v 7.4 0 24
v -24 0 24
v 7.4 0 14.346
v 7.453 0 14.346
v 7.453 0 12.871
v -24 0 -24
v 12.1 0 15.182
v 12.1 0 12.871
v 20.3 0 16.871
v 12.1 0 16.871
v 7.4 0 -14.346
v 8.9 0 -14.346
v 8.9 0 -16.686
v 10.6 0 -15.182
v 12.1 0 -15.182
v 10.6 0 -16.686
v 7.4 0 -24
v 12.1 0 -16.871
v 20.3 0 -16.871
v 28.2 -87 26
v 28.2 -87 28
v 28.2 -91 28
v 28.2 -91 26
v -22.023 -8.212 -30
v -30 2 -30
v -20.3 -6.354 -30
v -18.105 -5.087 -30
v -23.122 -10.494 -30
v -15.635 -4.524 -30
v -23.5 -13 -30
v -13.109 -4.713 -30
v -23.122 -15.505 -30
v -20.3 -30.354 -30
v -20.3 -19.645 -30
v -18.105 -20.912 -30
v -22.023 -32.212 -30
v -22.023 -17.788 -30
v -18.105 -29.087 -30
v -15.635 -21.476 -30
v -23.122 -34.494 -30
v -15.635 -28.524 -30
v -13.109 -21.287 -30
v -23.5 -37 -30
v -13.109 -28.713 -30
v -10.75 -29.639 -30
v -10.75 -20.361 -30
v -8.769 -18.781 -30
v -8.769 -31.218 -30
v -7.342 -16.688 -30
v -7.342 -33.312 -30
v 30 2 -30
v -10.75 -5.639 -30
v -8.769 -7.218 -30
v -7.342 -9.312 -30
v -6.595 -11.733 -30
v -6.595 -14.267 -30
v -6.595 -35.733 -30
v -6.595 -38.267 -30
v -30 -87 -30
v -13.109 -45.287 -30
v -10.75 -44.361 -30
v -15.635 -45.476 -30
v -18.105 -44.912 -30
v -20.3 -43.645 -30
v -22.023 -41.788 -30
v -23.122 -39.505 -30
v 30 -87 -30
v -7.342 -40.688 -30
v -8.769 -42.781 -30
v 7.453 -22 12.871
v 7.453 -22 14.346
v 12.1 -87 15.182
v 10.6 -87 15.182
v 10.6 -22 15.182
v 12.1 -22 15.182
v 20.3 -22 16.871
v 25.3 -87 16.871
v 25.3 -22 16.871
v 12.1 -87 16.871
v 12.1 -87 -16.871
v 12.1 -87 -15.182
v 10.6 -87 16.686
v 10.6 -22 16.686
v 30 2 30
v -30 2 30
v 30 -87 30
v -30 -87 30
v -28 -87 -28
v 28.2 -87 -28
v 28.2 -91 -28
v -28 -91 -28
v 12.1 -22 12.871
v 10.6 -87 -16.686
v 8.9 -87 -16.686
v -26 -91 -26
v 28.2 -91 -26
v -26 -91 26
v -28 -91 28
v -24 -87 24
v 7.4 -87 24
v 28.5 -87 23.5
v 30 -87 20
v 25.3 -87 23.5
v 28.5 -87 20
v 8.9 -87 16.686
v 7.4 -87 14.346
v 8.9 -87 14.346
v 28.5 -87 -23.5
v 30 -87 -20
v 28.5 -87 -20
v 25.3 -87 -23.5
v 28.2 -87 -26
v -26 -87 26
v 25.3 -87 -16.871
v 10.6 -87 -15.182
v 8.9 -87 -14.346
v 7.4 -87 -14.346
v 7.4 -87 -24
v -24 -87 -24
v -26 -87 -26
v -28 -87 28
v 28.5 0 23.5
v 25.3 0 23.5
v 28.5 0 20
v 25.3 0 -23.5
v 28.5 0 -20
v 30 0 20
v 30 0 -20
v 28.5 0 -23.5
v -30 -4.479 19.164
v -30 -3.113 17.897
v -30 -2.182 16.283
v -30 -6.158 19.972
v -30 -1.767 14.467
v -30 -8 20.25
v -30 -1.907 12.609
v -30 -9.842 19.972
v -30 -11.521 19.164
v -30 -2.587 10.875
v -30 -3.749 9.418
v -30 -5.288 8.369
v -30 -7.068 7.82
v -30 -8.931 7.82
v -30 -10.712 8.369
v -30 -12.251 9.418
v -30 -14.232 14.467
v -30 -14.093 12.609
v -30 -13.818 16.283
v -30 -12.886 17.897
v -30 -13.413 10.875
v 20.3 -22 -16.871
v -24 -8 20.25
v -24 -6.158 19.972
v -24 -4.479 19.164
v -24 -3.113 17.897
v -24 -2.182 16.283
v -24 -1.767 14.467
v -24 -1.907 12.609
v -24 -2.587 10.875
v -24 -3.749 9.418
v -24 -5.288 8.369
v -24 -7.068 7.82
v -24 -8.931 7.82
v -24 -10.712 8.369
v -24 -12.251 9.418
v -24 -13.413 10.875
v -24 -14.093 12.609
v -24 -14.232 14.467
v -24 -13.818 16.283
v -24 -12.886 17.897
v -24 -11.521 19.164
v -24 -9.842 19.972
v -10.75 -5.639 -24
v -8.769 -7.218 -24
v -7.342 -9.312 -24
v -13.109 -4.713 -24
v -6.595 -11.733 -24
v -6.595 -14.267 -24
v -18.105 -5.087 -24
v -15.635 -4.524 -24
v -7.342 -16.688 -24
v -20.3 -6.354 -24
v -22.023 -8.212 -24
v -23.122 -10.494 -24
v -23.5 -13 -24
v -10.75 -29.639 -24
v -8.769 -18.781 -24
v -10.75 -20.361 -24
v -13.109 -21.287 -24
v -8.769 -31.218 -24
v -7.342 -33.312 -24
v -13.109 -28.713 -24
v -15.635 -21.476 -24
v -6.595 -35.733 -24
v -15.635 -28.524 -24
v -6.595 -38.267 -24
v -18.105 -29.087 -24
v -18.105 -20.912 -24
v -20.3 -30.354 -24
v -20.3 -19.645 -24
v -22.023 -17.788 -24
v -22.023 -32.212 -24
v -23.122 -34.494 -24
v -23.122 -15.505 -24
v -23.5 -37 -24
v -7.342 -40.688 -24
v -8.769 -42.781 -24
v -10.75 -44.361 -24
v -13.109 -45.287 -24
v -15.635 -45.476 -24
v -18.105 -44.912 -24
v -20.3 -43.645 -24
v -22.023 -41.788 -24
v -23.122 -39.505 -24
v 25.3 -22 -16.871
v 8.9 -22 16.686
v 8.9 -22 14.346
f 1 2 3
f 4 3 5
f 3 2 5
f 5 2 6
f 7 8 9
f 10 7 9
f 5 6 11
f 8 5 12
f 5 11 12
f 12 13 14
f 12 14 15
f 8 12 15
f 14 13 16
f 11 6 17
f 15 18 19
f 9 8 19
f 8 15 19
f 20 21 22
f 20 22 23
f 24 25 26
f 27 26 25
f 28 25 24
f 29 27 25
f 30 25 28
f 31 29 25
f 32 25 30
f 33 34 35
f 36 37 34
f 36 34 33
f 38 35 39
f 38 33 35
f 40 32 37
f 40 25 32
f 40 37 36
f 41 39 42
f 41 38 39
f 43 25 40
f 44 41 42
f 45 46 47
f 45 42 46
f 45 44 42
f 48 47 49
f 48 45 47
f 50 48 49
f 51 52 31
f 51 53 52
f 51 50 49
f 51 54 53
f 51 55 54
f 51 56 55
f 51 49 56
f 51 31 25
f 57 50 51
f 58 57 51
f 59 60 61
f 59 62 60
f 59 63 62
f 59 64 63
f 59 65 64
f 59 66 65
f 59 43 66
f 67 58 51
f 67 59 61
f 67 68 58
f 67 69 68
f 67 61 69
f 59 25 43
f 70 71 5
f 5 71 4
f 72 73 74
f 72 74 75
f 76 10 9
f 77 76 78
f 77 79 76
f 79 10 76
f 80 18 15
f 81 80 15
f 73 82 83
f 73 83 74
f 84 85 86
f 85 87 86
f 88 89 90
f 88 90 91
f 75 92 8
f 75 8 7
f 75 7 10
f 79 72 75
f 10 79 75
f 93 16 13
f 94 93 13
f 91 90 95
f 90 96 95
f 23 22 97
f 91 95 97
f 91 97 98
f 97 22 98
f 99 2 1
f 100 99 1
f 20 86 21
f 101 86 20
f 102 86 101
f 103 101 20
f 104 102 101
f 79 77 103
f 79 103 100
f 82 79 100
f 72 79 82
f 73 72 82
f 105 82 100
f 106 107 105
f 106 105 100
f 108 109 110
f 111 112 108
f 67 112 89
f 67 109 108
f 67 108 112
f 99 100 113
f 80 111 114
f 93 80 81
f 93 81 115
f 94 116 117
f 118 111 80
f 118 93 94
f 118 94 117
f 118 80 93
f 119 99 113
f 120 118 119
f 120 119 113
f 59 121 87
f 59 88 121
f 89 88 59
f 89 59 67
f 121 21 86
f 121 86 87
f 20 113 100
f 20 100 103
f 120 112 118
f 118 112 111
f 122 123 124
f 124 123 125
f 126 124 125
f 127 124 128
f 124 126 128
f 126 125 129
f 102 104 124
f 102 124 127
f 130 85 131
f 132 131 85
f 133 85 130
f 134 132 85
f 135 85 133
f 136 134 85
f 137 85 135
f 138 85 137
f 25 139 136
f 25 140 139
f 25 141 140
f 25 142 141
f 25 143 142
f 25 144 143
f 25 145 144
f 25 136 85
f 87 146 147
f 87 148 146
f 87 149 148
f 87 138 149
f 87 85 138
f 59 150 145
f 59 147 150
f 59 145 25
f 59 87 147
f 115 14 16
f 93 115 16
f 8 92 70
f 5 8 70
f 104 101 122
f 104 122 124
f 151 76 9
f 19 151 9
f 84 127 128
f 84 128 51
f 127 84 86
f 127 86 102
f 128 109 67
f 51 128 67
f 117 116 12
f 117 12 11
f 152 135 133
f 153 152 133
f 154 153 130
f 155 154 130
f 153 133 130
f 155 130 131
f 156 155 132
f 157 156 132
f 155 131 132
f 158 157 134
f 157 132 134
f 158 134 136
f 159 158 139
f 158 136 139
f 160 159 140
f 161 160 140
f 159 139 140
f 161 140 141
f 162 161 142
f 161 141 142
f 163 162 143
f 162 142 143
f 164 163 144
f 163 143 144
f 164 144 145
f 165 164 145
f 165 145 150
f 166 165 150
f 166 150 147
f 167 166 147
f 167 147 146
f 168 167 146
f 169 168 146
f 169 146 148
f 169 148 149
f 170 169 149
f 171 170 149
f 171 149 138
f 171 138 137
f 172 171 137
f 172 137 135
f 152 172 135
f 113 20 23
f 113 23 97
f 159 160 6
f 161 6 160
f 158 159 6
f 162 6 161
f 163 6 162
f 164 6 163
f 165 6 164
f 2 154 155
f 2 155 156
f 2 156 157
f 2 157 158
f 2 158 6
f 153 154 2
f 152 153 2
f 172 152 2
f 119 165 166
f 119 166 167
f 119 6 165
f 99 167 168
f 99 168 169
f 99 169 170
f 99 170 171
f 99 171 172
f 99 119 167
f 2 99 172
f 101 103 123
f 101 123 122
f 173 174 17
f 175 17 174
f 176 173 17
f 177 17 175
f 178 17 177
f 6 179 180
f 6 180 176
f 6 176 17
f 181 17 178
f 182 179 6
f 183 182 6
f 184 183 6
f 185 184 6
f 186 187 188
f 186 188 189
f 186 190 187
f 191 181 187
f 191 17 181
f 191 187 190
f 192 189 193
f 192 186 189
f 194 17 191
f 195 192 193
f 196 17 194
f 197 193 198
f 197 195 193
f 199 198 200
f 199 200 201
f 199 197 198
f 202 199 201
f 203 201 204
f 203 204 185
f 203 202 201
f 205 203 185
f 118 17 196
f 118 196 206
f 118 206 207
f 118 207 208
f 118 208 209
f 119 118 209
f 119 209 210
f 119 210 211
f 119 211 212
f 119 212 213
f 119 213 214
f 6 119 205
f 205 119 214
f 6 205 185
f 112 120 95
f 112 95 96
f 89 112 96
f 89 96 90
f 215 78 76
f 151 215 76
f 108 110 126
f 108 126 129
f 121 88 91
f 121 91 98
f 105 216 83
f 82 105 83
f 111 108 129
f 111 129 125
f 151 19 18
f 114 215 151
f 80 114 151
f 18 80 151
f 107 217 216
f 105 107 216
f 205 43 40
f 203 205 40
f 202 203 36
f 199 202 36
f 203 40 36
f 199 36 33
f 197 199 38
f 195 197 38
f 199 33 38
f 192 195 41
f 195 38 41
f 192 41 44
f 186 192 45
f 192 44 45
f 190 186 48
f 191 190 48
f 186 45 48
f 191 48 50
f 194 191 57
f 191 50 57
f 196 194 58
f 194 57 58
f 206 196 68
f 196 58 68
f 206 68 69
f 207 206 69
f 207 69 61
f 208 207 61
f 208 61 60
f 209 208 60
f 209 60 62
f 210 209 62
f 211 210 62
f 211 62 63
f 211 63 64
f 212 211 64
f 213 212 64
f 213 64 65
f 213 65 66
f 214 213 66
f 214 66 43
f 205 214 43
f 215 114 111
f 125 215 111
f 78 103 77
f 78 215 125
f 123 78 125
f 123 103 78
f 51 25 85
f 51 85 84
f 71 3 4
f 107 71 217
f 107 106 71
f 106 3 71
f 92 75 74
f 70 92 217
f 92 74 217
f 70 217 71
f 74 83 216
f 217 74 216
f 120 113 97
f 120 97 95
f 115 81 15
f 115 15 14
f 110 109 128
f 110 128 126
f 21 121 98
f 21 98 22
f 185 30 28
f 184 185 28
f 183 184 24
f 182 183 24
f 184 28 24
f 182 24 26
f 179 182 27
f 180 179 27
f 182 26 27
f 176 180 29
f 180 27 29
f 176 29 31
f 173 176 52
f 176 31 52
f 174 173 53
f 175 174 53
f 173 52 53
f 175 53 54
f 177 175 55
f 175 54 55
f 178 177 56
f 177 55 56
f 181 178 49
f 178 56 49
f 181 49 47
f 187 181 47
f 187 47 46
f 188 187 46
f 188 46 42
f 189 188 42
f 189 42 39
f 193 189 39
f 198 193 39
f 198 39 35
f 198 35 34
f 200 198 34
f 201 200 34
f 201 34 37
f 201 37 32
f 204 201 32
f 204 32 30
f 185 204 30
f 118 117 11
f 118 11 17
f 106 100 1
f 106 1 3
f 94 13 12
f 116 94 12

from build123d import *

# Parameters (mm, degrees)
BOSS_EXTRUDE1_DEPTH      = 0.0001
BOSS_EXTRUDE1_DEPTH_BACK = 87
SKETCH4_W                = 60
SKETCH4_H                = 60
BOSS_EXTRUDE2_DEPTH      = 2
SKETCH10_W               = 4.646690451
SKETCH10_H               = 22.0001
BOSS_EXTRUDE6_DEPTH      = 4
SKETCH12_W               = 5
SKETCH12_H               = 22.0001
BOSS_EXTRUDE7_DEPTH      = 33.742899166
BOSS_EXTRUDE8_DEPTH      = 4
SKETCH13_R               = 6.25
CUT_EXTRUDE1_DEPTH       = 10
SKETCH14_R               = 8.5
CUT_EXTRUDE2_DEPTH       = 10


with BuildPart() as part:
    # Sketch1 → Boss-Extrude1 (new, two sides: drawn at the far end of the back side and taken through both)
    with BuildSketch(Plane(origin=(0, 0, 0), x_dir=(1, 0, 0), z_dir=(0, 1, 0)).offset(-BOSS_EXTRUDE1_DEPTH_BACK)):
        Polygon((30, 20), (28.5, 20), (28.5, 23.5), (25.3, 23.5), (25.3, 16.871449583), (12.1, 16.871449583), (12.1, 15.181819085), (10.6, 15.181819085), (10.6, 16.685724792), (8.9, 16.685724792), (8.9, 14.346236409), (7.4, 14.346236409), (7.4, 24), (-24, 24), (-24, -24), (7.4, -24), (7.4, -14.346236409), (8.9, -14.346236409), (8.9, -16.685724792), (10.6, -16.685724792), (10.6, -15.181819085), (12.1, -15.181819085), (12.1, -16.871449583), (25.3, -16.871449583), (25.3, -23.5), (28.5, -23.5), (28.5, -20), (30, -20), (30, -30), (-30, -30), (-30, 30), (30, 30), align=None)
    extrude(amount=BOSS_EXTRUDE1_DEPTH + BOSS_EXTRUDE1_DEPTH_BACK)

    # Sketch4 → Boss-Extrude2 (add)
    with BuildSketch(Plane(origin=(0, 0.0001, 0), x_dir=(1, 0, 0), z_dir=(0, 1, 0))):
        Rectangle(SKETCH4_W, SKETCH4_H)
    extrude(amount=BOSS_EXTRUDE2_DEPTH)

    # Sketch10 → Boss-Extrude6 (add)
    with BuildSketch(Plane(origin=(0, 0, 16.871449583), x_dir=(-1, 0, 0), z_dir=(0, 0, -1))):
        with Locations((-9.776654775, -10.99995)):
            Rectangle(SKETCH10_W, SKETCH10_H)
    extrude(amount=BOSS_EXTRUDE6_DEPTH)

    # Sketch12 → Boss-Extrude7 (add)
    with BuildSketch(Plane(origin=(0, 0, 16.871449583), x_dir=(-1, 0, 0), z_dir=(0, 0, -1))):
        with Locations((-22.8, -10.99995)):
            Rectangle(SKETCH12_W, SKETCH12_H)
    extrude(amount=BOSS_EXTRUDE7_DEPTH)

    # Sketch6 → Boss-Extrude8 (add)
    with BuildSketch(Plane.XZ.offset(87)):
        Polygon((28.2, -28), (-28, -28), (-28, 28), (28.2, 28), (28.2, 26), (-26, 26), (-26, -26), (28.2, -26), align=None)
    extrude(amount=BOSS_EXTRUDE8_DEPTH)

    # Sketch13 → Cut-Extrude1 (cut)
    with BuildSketch(Plane.ZY.offset(30)):
        with Locations((14, -7.9999)):
            Circle(SKETCH13_R)
    extrude(amount=-CUT_EXTRUDE1_DEPTH, mode=Mode.SUBTRACT)

    # Sketch14 → Cut-Extrude2 (cut)
    with BuildSketch(Plane(origin=(0, 0, -30), x_dir=(-1, 0, 0), z_dir=(0, 0, -1))):
        with Locations((15, -12.9999)):
            Circle(SKETCH14_R)
        with Locations((15, -36.9999)):
            Circle(SKETCH14_R)
    extrude(amount=-CUT_EXTRUDE2_DEPTH, mode=Mode.SUBTRACT)


solid = part.part
